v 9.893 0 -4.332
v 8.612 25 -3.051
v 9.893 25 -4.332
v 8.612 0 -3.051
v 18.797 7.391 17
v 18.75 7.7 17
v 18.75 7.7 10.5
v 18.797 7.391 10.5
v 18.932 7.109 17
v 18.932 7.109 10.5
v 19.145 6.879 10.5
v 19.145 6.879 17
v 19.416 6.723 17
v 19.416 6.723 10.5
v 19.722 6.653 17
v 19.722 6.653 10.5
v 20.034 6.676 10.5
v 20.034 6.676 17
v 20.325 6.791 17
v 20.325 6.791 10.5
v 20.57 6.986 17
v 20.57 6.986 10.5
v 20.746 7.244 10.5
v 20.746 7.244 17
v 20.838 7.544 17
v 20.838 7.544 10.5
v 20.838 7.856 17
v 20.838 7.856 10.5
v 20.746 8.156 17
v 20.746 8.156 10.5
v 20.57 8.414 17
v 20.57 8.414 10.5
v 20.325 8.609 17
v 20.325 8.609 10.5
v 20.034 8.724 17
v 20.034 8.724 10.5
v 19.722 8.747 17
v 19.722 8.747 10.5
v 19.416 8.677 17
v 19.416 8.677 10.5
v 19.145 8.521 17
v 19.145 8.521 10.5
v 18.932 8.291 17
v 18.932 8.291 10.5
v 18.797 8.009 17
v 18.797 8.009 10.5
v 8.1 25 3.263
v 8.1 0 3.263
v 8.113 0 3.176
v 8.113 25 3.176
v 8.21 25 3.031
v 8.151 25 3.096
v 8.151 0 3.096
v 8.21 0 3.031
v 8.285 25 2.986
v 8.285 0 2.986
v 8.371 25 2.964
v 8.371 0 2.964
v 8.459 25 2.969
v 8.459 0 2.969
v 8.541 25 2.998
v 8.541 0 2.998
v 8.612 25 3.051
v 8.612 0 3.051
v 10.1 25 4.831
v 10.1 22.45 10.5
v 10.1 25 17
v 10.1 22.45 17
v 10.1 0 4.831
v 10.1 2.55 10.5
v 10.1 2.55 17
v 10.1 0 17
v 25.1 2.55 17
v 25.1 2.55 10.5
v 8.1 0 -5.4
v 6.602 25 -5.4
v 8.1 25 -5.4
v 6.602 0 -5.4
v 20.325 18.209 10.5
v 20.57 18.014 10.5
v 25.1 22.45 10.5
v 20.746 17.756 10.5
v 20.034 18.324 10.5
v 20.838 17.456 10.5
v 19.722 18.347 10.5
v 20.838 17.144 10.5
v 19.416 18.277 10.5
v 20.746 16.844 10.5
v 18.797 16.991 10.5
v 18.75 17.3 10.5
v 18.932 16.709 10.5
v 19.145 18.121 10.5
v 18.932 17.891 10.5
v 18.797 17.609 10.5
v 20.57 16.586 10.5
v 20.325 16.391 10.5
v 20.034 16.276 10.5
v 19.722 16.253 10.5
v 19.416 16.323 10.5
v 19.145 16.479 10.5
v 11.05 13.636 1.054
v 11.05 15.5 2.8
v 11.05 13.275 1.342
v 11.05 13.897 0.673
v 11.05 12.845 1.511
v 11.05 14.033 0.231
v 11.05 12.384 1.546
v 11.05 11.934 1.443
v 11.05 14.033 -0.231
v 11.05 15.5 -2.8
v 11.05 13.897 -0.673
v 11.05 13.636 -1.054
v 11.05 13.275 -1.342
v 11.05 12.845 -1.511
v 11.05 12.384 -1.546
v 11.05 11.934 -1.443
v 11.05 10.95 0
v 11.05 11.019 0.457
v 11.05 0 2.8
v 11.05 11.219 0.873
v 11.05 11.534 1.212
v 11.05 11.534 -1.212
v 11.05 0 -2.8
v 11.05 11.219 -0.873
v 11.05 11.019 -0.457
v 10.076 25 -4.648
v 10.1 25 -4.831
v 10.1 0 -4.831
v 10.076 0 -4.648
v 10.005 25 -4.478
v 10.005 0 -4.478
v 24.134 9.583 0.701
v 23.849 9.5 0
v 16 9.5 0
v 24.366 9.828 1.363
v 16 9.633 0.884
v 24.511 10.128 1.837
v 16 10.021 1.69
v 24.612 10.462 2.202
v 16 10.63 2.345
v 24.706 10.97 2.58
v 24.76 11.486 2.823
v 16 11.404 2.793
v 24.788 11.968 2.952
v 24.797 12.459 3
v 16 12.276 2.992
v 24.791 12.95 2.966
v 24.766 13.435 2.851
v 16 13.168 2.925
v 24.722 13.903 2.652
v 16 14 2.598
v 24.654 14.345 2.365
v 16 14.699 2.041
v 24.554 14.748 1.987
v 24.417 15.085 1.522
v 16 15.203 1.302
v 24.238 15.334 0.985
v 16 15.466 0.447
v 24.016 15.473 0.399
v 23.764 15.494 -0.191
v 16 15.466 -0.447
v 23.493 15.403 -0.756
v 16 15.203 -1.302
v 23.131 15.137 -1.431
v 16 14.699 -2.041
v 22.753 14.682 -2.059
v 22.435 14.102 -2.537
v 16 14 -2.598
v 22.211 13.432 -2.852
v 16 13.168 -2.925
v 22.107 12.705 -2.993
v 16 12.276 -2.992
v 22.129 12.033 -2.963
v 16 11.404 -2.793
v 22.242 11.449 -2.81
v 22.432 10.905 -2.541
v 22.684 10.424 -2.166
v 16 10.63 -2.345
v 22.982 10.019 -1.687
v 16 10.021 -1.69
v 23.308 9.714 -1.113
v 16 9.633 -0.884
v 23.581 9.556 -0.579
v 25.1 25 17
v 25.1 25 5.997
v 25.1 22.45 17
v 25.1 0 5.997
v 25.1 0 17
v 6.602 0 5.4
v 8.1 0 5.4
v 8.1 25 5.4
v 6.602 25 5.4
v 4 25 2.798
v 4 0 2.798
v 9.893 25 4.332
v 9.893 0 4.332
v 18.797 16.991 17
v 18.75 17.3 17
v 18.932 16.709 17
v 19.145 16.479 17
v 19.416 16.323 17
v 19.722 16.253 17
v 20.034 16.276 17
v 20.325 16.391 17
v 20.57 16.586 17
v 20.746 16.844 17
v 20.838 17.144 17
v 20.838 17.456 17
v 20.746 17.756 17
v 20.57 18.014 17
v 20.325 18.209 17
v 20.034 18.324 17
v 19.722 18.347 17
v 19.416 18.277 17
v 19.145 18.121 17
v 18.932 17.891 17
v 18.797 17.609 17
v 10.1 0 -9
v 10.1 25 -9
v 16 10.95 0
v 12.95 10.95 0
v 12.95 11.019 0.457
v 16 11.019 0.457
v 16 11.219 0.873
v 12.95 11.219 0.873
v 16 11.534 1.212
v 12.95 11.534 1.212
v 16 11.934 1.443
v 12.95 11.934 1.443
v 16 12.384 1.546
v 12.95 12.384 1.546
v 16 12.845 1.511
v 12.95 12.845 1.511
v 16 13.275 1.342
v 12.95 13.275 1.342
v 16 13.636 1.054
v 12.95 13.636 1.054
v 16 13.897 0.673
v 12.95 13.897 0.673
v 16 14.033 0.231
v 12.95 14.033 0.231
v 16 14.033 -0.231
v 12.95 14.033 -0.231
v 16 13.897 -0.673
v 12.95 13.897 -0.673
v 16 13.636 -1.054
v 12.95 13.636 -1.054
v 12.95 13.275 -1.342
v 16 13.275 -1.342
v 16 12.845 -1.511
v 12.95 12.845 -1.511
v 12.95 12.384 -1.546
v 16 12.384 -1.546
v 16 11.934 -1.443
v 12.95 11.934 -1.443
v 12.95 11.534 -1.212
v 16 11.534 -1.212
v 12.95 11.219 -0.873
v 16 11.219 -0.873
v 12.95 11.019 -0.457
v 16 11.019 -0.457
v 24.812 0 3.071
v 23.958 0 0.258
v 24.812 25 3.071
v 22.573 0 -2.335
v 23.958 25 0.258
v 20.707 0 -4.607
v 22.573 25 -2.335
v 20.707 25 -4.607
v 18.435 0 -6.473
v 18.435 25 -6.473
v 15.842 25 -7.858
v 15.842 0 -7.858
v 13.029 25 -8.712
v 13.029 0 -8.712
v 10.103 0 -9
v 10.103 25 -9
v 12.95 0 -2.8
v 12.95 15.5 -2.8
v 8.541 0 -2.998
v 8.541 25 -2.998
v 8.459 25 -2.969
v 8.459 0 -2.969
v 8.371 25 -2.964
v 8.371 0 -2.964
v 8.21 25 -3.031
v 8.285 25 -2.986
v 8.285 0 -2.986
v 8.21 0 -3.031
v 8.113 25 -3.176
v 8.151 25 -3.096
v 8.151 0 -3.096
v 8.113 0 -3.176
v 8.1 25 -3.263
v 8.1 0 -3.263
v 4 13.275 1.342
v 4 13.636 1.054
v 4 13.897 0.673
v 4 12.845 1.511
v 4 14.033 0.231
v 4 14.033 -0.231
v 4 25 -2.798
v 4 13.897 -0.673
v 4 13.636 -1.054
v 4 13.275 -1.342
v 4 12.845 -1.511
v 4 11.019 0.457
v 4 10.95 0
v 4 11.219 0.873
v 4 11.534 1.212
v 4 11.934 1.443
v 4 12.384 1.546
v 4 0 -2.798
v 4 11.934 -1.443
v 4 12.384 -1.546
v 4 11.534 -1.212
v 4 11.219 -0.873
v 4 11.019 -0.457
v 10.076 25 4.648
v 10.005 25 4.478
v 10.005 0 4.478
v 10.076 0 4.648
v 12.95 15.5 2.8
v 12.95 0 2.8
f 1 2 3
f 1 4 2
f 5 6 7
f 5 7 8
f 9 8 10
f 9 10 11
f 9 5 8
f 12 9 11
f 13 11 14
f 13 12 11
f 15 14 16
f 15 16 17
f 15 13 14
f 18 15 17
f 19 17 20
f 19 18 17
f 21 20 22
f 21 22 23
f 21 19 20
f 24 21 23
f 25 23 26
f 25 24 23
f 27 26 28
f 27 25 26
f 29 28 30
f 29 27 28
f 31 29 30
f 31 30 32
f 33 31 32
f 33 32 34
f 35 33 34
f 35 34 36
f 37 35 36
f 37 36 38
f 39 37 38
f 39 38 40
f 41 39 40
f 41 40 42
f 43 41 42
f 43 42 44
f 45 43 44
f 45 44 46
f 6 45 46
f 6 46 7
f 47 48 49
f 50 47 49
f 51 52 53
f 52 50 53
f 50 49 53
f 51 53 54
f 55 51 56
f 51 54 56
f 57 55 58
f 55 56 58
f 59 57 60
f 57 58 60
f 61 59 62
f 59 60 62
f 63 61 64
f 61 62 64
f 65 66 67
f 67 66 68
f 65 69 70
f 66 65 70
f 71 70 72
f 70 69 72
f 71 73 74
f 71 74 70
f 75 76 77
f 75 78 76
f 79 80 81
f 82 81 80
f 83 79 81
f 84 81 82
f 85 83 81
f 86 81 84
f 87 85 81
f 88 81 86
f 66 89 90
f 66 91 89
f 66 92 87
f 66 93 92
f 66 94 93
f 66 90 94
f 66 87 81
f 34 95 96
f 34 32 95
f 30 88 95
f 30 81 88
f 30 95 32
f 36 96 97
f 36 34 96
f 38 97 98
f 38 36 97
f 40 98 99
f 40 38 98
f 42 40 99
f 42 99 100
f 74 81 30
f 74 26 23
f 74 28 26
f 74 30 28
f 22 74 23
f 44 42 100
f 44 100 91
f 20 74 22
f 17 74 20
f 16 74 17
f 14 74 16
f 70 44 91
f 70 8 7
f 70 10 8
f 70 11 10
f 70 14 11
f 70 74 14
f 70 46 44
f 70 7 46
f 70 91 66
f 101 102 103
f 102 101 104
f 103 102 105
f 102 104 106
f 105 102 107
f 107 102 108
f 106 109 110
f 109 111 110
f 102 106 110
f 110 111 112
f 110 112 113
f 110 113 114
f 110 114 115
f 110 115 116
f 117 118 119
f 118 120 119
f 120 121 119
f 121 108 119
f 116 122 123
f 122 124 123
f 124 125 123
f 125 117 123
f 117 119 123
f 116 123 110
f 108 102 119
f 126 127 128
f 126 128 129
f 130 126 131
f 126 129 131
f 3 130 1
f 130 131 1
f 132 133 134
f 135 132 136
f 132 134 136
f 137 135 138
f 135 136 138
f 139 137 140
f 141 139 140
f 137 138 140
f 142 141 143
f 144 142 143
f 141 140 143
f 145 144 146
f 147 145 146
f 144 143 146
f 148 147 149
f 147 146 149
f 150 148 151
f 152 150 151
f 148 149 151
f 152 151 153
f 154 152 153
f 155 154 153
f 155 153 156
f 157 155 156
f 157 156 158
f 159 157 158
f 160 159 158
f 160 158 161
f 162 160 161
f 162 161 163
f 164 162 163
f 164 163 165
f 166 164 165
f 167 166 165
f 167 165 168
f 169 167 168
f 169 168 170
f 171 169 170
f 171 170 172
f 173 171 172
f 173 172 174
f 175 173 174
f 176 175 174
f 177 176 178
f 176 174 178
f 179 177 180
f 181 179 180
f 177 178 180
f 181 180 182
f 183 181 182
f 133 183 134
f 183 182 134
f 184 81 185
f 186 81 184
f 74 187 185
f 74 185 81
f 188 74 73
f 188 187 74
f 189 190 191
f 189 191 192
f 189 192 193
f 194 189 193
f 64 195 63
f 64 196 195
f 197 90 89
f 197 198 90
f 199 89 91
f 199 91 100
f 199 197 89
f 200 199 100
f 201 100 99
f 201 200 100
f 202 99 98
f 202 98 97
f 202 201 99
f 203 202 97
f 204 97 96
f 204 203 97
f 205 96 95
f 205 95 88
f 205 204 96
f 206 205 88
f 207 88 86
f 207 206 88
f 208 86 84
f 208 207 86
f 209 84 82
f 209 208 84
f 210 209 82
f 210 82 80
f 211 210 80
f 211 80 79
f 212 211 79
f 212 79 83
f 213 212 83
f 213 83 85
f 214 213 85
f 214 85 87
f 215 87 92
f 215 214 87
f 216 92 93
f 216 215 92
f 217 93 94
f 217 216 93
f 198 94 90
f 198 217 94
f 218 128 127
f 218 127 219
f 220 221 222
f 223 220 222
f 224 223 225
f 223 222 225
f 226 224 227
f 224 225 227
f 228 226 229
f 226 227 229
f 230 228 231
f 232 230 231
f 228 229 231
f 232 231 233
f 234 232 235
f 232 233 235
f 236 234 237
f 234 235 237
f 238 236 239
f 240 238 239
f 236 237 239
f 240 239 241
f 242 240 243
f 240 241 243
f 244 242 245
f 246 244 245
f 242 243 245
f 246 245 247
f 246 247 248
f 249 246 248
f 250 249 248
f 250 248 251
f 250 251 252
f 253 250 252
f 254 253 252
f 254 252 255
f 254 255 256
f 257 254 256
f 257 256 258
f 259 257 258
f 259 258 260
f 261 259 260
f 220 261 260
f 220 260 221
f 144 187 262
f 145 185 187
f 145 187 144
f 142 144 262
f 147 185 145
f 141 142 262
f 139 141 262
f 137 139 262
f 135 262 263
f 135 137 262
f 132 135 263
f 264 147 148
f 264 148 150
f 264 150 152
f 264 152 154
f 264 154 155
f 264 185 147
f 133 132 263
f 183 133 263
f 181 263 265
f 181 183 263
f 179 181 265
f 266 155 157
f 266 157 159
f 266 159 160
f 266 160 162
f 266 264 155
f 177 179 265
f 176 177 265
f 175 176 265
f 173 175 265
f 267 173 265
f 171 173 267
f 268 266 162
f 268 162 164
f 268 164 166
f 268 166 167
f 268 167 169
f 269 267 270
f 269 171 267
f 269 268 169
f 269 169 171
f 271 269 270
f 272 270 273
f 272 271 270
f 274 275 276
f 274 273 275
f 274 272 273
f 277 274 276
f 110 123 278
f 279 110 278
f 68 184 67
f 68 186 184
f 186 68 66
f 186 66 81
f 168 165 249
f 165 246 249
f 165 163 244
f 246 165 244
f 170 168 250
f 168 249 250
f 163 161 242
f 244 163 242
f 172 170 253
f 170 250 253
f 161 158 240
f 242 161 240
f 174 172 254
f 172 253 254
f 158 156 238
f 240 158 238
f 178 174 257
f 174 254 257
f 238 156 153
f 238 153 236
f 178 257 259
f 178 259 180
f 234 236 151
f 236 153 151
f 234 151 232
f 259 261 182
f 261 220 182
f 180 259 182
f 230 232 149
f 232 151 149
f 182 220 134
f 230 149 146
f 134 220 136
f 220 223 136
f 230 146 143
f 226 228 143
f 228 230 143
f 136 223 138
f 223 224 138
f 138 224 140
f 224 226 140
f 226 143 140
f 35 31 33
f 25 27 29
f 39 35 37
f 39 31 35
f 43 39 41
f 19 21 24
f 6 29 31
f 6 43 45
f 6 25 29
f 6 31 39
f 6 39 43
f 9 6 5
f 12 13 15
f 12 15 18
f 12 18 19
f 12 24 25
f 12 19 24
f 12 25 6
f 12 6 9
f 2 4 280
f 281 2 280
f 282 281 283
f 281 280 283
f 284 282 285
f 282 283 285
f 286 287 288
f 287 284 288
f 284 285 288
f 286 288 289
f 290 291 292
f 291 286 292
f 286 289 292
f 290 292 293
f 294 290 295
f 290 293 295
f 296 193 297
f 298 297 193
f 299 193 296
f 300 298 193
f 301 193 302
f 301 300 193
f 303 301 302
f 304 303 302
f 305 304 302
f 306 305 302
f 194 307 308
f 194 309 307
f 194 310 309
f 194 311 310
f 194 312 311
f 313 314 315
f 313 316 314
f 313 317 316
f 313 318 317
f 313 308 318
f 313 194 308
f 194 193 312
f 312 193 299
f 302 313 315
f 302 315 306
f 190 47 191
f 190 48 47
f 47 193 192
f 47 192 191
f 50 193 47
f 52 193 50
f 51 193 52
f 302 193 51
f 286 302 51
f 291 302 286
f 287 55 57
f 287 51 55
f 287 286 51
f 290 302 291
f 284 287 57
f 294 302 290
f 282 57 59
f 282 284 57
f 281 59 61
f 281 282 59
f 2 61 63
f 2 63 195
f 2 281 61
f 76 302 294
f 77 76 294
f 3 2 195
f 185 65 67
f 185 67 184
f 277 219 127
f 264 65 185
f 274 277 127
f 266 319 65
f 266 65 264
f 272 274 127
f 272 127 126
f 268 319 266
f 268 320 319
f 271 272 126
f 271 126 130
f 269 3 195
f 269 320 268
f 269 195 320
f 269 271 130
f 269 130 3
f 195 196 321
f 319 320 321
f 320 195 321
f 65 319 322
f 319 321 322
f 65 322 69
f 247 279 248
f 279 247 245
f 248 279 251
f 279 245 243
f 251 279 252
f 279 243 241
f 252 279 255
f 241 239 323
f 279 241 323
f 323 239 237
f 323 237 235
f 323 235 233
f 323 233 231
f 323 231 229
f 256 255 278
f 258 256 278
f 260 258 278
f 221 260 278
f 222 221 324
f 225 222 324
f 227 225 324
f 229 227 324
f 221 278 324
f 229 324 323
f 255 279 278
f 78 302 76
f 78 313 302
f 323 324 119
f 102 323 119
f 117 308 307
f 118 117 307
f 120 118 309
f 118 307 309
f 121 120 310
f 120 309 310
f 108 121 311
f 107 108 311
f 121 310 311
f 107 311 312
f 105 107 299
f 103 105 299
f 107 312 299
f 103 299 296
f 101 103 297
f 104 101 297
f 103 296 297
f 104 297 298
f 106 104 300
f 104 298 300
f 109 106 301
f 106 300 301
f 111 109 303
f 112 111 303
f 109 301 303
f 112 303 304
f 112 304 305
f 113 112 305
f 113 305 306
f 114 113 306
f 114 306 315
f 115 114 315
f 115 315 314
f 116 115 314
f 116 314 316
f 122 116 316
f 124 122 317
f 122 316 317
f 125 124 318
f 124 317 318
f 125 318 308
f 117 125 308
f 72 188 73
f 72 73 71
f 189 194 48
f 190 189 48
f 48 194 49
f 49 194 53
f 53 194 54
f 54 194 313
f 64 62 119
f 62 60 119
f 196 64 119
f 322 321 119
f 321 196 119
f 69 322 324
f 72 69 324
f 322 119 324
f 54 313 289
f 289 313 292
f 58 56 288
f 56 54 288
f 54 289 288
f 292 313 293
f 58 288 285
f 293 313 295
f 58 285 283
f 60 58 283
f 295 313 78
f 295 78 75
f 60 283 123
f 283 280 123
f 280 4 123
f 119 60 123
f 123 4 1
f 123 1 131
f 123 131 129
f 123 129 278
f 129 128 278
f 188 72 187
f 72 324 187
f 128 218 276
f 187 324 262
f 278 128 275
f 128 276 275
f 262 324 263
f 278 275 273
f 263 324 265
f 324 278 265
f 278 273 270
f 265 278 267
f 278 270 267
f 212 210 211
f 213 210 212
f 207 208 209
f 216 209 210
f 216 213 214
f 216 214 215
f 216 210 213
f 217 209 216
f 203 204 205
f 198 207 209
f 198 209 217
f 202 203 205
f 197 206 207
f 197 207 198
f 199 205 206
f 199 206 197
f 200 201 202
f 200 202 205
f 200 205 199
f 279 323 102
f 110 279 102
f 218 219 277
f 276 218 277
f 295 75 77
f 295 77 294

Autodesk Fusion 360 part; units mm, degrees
sketch "Sketch1" plane through (0, 0, 0) normal (0, 1, 0) x (1, 0, 0)
  line L0 (-4.4022, -9.8222) -> (-3.1214, -8.5414)
  arc A0 (10, -4.8314) -> (9.8222, -4.4022) centre (9.3929, -4.8314) ccw
  line L1 (6.5607, -5.5) -> (3.9, -2.8393)
  line L2 (-9.9987, -4.7917) -> (-10, -9.5)
  line L3 (9.8222, -4.4022) -> (8.5414, -3.1214)
  arc A1 (-3.2628, 8.2) -> (-3.1214, 8.5414) centre (-3.2628, 8.4) ccw
  line L4 (3.9, 2.8393) -> (6.5607, 5.5)
  arc A2 (-8.5414, 3.1214) -> (-8.2, 3.2628) centre (-8.4, 3.2628) ccw
  line L5 (-4.8314, 10) -> (-9.5, 10)
  line L6 (-6.5607, 5.5) -> (-3.9, 2.8393)
  arc A3 (-9.5, 10) -> (-10, 9.5) centre (-9.5, 9.5) ccw
  arc A4 (8.2, 3.2628) -> (8.5414, 3.1214) centre (8.4, 3.2628) ccw
  line L7 (-5.5, 6.5607) -> (-5.5, 8.2)
  line L8 (6.5607, 5.5) -> (8.2, 5.5)
  line L9 (8.5414, 3.1214) -> (9.8222, 4.4022)
  arc A5 (3.1214, 8.5414) -> (3.2628, 8.2) centre (3.2628, 8.4) ccw
  line L10 (-8.2, 3.2628) -> (-8.2, 5.5)
  line L11 (9.5, 10) -> (4.8314, 10)
  arc A6 (10, 9.5) -> (9.5, 10) centre (9.5, 9.5) ccw
  line L12 (10, 4.8314) -> (10, 9.5)
  arc A7 (-4.4312, 9.8494) -> (-4.8314, 10) centre (-4.8314, 9.3929) ccw
  line L13 (-9.8494, 4.4312) -> (-8.5414, 3.1214)
  line L14 (4.4022, 9.8222) -> (3.1214, 8.5414)
  line L15 (-5.5, 8.2) -> (-3.2628, 8.2)
  line L16 (5.5, 8.2) -> (5.5, 6.5607)
  arc A8 (-10, 4.9) -> (-9.8494, 4.4312) centre (-9.3734, 4.8428) ccw
  circle A9 centre (0, 0) radius 2.1
  arc A10 (4.8314, 10) -> (4.4022, 9.8222) centre (4.8314, 9.3929) ccw
  line L17 (-2.8393, 3.9) -> (-5.5, 6.5607)
  line L18 (5.5, 6.5607) -> (2.8393, 3.9)
  line L19 (-3.9, 2.8393) -> (-3.9, -2.8393)
  line L20 (-10, 9.5) -> (-10, 4.9)
  line L21 (2.8393, 3.9) -> (-2.8393, 3.9)
  line L22 (3.9, -2.8393) -> (3.9, 2.8393)
  line L23 (3.2628, 8.2) -> (5.5, 8.2)
  line L24 (8.2, 5.5) -> (8.2, 3.2628)
  line L25 (5.5, -6.5607) -> (5.5, -8.2)
  arc A11 (4.2336, -9.6536) -> (4.8314, -10) centre (4.8837, -9.2207) ccw
  arc A12 (-4.8314, -10) -> (-4.4022, -9.8222) centre (-4.8314, -9.3929) ccw
  line L26 (-5.5, -6.5607) -> (-2.8393, -3.9)
  line L27 (10, -9.5) -> (10, -4.8314)
  line L28 (-8.5414, -3.1214) -> (-9.8222, -4.4022)
  line L29 (5.5, -8.2) -> (3.2628, -8.2)
  line L30 (4.8314, -10) -> (9.5, -10)
  line L31 (-8.2, -5.5) -> (-8.2, -3.2628)
  arc A13 (8.5414, -3.1214) -> (8.2, -3.2628) centre (8.4, -3.2628) ccw
  line L32 (-2.8393, -3.9) -> (2.8393, -3.9)
  arc A14 (-8.2, -3.2628) -> (-8.5414, -3.1214) centre (-8.4, -3.2628) ccw
  arc A15 (-3.1214, -8.5414) -> (-3.2628, -8.2) centre (-3.2628, -8.4) ccw
  line L33 (3.1214, -8.5414) -> (4.2336, -9.6536)
  line L34 (-5.5, -8.2) -> (-5.5, -6.5607)
  line L35 (-6.5607, -5.5) -> (-8.2, -5.5)
  line L36 (8.2, -3.2628) -> (8.2, -5.5)
  arc A16 (-9.8222, -4.4022) -> (-9.9987, -4.7917) centre (-9.3929, -4.8314) ccw
  line L37 (-9.5, -10) -> (-4.8314, -10)
  arc A17 (-10, -9.5) -> (-9.5, -10) centre (-9.5, -9.5) ccw
  arc A18 (3.2628, -8.2) -> (3.1214, -8.5414) centre (3.2628, -8.4) ccw
  line L38 (8.2, -5.5) -> (6.5607, -5.5)
  line L39 (-3.2628, -8.2) -> (-5.5, -8.2)
  line L40 (-3.9, -2.8393) -> (-6.5607, -5.5)
  line L41 (2.8393, -3.9) -> (5.5, -6.5607)
  arc A19 (9.5, -10) -> (10, -9.5) centre (9.5, -9.5) ccw
  line L42 (-3.1214, 8.5414) -> (-4.4312, 9.8494)
  arc A20 (9.8222, 4.4022) -> (10, 4.8314) centre (9.3929, 4.8314) ccw
  line L43 (-8.2, 5.5) -> (-6.5607, 5.5)
  line L44 (4, 2.7979) -> (6.6021, 5.4)
  line L45 (6.6021, 5.4) -> (8.1, 5.4)
  line L46 (8.1, 5.4) -> (8.1, 3.2628)
  arc A21 (8.1, 3.2628) -> (8.6121, 3.0507) centre (8.4, 3.2628) ccw
  line L47 (8.6121, 3.0507) -> (9.8929, 4.3315)
  arc A22 (9.8929, 4.3315) -> (10.1, 4.8314) centre (9.3929, 4.8314) ccw
  line L48 (10.1, 4.8314) -> (10.1, 9.5)
  arc A23 (10.1, 9.5) -> (9.5, 10.1) centre (9.5, 9.5) ccw
  line L49 (9.5, 10.1) -> (4.8314, 10.1)
  arc A24 (4.8314, 10.1) -> (4.3315, 9.8929) centre (4.8314, 9.3929) ccw
  line L50 (4.3315, 9.8929) -> (3.0507, 8.6121)
  arc A25 (3.0507, 8.6121) -> (3.2628, 8.1) centre (3.2628, 8.4) ccw
  line L51 (3.2628, 8.1) -> (5.4, 8.1)
  line L52 (5.4, 8.1) -> (5.4, 6.6021)
  line L53 (5.4, 6.6021) -> (2.7979, 4)
  line L54 (2.7979, 4) -> (-2.7979, 4)
  line L55 (-2.7979, 4) -> (-5.4, 6.6021)
  line L56 (-5.4, 6.6021) -> (-5.4, 8.1)
  line L57 (-5.4, 8.1) -> (-3.2628, 8.1)
  arc A26 (-3.2628, 8.1) -> (-3.0509, 8.6124) centre (-3.2628, 8.4) ccw
  line L58 (-3.0509, 8.6124) -> (-4.3627, 9.9223)
  arc A27 (-4.3627, 9.9223) -> (-4.8314, 10.1) centre (-4.8314, 9.3929) ccw
  line L59 (-4.8314, 10.1) -> (-9.5, 10.1)
  arc A28 (-9.5, 10.1) -> (-10.1, 9.5) centre (-9.5, 9.5) ccw
  line L60 (-10.1, 9.5) -> (-10.1, 4.9044)
  arc A29 (-10.1, 4.9044) -> (-9.9226, 4.363) centre (-9.3734, 4.8428) ccw
  line L61 (-9.9226, 4.363) -> (-8.6124, 3.0509)
  arc A30 (-8.6124, 3.0509) -> (-8.1, 3.2628) centre (-8.4, 3.2628) ccw
  line L62 (-8.1, 3.2628) -> (-8.1, 5.4)
  line L63 (-8.1, 5.4) -> (-6.6021, 5.4)
  line L64 (-6.6021, 5.4) -> (-4, 2.7979)
  line L65 (-4, 2.7979) -> (-4, -2.7979)
  line L66 (-4, -2.7979) -> (-6.6021, -5.4)
  line L67 (-6.6021, -5.4) -> (-8.1, -5.4)
  line L68 (-8.1, -5.4) -> (-8.1, -3.2628)
  arc A31 (-8.1, -3.2628) -> (-8.6121, -3.0507) centre (-8.4, -3.2628) ccw
  line L69 (-8.6121, -3.0507) -> (-9.8929, -4.3315)
  arc A32 (-9.8929, -4.3315) -> (-10.0987, -4.7886) centre (-9.3929, -4.8314) ccw
  line L70 (-10.0987, -4.7886) -> (-10.1, -9.4997)
  arc A33 (-10.1, -9.4997) -> (-9.5, -10.1) centre (-9.5, -9.5) ccw
  line L71 (-9.5, -10.1) -> (-4.8314, -10.1)
  arc A34 (-4.8314, -10.1) -> (-4.3315, -9.8929) centre (-4.8314, -9.3929) ccw
  line L72 (-4.3315, -9.8929) -> (-3.0507, -8.6121)
  arc A35 (-3.0507, -8.6121) -> (-3.2628, -8.1) centre (-3.2628, -8.4) ccw
  line L73 (-3.2628, -8.1) -> (-5.4, -8.1)
  line L74 (-5.4, -8.1) -> (-5.4, -6.6021)
  line L75 (-5.4, -6.6021) -> (-2.7979, -4)
  line L76 (-2.7979, -4) -> (2.7979, -4)
  line L77 (2.7979, -4) -> (5.4, -6.6021)
  line L78 (5.4, -6.6021) -> (5.4, -8.1)
  line L79 (5.4, -8.1) -> (3.2628, -8.1)
  arc A36 (3.2628, -8.1) -> (3.0507, -8.6121) centre (3.2628, -8.4) ccw
  line L80 (3.0507, -8.6121) -> (4.1561, -9.7175)
  arc A37 (4.1561, -9.7175) -> (4.8282, -10.1) centre (4.8837, -9.2207) ccw
  line L81 (4.8282, -10.1) -> (9.5, -10.1)
  arc A38 (9.5, -10.1) -> (10.1, -9.5) centre (9.5, -9.5) ccw
  line L82 (10.1, -9.5) -> (10.1, -4.8314)
  arc A39 (10.1, -4.8314) -> (9.8929, -4.3315) centre (9.3929, -4.8314) ccw
  line L83 (9.8929, -4.3315) -> (8.6121, -3.0507)
  arc A40 (8.6121, -3.0507) -> (8.1, -3.2628) centre (8.4, -3.2628) ccw
  line L84 (8.1, -3.2628) -> (8.1, -5.4)
  line L85 (8.1, -5.4) -> (6.6021, -5.4)
  line L86 (6.6021, -5.4) -> (4, -2.7979)
  line L87 (4, -2.7979) -> (4, 2.7979)
  line L88 (9, 9) -> (25.1, 9)
  line L89 (25.1, 9) -> (25.1, -17)
  line L90 (25.1, -17) -> (9, -17)
  line L91 (9, -17) -> (9, 9)
  line L92 (10.1, -5.988) -> (10.1, -17)
  dimension "d1" = 0.1
  dimension "d2" = 16.1
  dimension "d3" = 26
extrude "Extrude1" add sketch "Sketch1" along normal blind 25 contours L47 A22 L48 L82 A39 L83 L88 L89 L90 L91 L92 | L44 L45 L46 A21 L47 L83 A40 L84 L85 L86 L87 L91
fillet "Fillet1" radius 15 1 edges at (25.1, 12.5, -9)
sketch "Sketch2" plane through (0, 0, 17) normal (0, 0, 1) x (-1, 0, 0)
  line L0 (-10.1, 0) -> (-25.1, 0)
  line L1 (-25.1, 0) -> (-25.1, -25)
  line L2 (-25.1, -25) -> (-10.1, -25)
  line L3 (-10.1, -25) -> (-10.1, 0)
  line L4 (-10.1, 0) -> (-12.1, 0) construction
  line L5 (-12.1, 0) -> (-25.1, 0) construction
  line L6 (-18.6, 0) -> (-18.6, -25) construction
  line L7 (-25.1, -12.5) -> (-18.6, -12.5) construction
  line L8 (-25.1, -2.55) -> (-12.1, -2.55)
  line L9 (-12.1, -2.55) -> (-12.1, -22.45)
  line L10 (-12.1, -22.45) -> (-25.1, -22.45)
  line L11 (-25.1, -22.45) -> (-25.1, -2.55)
  line L12 (-25.1, -2.55) -> (-12.1, -22.45) construction
  line L13 (-12.1, -2.55) -> (-25.1, -22.45) construction
  line L14 (-12.1, -2.55) -> (-19.8, -2.55) construction
  line L15 (-19.8, -2.55) -> (-19.8, -22.45) construction
  line L16 (-19.8, -2.55) -> (-19.8, -7.7) construction
  line L17 (-19.8, -7.7) -> (-19.8, -17.3) construction
  line L18 (-19.8, -17.3) -> (-19.8, -22.45) construction
  circle A0 centre (-19.8, -7.7) radius 1.05
  circle A1 centre (-19.8, -17.3) radius 1.05
  line L19 (-12.1, -2.55) -> (-10.1, -2.55)
  line L20 (-10.1, -2.55) -> (-10.1, -22.45)
  line L21 (-10.1, -22.45) -> (-12.1, -22.45)
  line L22 (-12.1, -22.45) -> (-12.1, -2.55)
  point P0 (-18.6, -12.5)
  dimension "d8" = 2
  dimension "d9" = 19.9
  dimension "d10" = 7.7
  dimension "d11" = 5.15
  dimension "d12" = 9.6
  dimension "d13" = 5.15
  dimension "d14" = 2.1
  dimension "d15" = 2.1
  dimension "d16" = 19.9
extrude "Extrude2" cut sketch "Sketch2" against normal blind 6.5 contours L3 L9 L19 L20 L21 L22 | L1 L8 L9 L10 L11 L22
sketch "Sketch3" plane through (0, 25, 0) normal (0, 1, 0) x (-1, 0, 0)
  arc A0 (-25.1, 6) -> (-10.1, -9) centre (-10.1, 6) ccw
  line L0 (-10.1, -9) -> (-10.1, -4.8314)
  arc A1 (-9.8929, -4.3315) -> (-10.1, -4.8314) centre (-9.3929, -4.8314) ccw
  line L1 (-9.8929, -4.3315) -> (-8.6121, -3.0507)
  arc A2 (-8.1, -3.2628) -> (-8.6121, -3.0507) centre (-8.4, -3.2628) ccw
  line L2 (-8.1, -3.2628) -> (-8.1, -5.4)
  line L3 (-8.1, -5.4) -> (-6.6021, -5.4)
  line L4 (-6.6021, -5.4) -> (-4, -2.7979)
  line L5 (-4, -2.7979) -> (-4, 2.7979)
  line L6 (-4, 2.7979) -> (-6.6021, 5.4)
  line L7 (-6.6021, 5.4) -> (-8.1, 5.4)
  line L8 (-8.1, 5.4) -> (-8.1, 3.2628)
  arc A3 (-8.6121, 3.0507) -> (-8.1, 3.2628) centre (-8.4, 3.2628) ccw
  line L9 (-8.6121, 3.0507) -> (-9.8929, 4.3315)
  arc A4 (-10.1, 4.8314) -> (-9.8929, 4.3315) centre (-9.3929, 4.8314) ccw
  line L10 (-10.1, 4.8314) -> (-10.1, 5.988)
  line L11 (-10.1, 5.988) -> (-10.1, 17)
  line L12 (-10.1, 17) -> (-25.1, 17)
  line L13 (-25.1, 17) -> (-25.1, 6)
  line L14 (-12.95, 2.8) -> (-11.05, 2.8)
  line L15 (-11.05, 2.8) -> (-11.05, -2.8)
  line L16 (-11.05, -2.8) -> (-12.95, -2.8)
  line L17 (-12.95, -2.8) -> (-12.95, 2.8)
  line L18 (-12.95, 2.8) -> (-11.05, -2.8) construction
  line L19 (-11.05, 2.8) -> (-12.95, -2.8) construction
  point P0 (-12, 0)
  dimension "d19" = 1.9
  dimension "d20" = 5.6
sketch "Sketch4" plane through (4, 0, 0) normal (-1, 0, 0) x (0, -1, 0)
  line L0 (0, -2.7979) -> (0, 2.7979)
  line L1 (0, 2.7979) -> (-25, 2.7979)
  line L2 (-25, 2.7979) -> (-25, -2.7979)
  line L3 (-25, -2.7979) -> (0, -2.7979)
  line L4 (0, 0) -> (-12.5, 0) construction
  circle A0 centre (-12.5, 0) radius 1.55
  circle A1 centre (-12.5, 0) radius 3
  dimension "d21" = 3.1
  dimension "d22" = 6
extrude "Extrude3" cut sketch "Sketch4" against normal blind 21 contours A0
extrude "Extrude4" cut sketch "Sketch4" against normal blind 10 from surface at -12 contours L3 A1 | L1 L3 A1 | L1 A1
extrude "Extrude5" cut sketch "Sketch3" along normal blind 15.5 from surface at -25 contours L14 L15 L16 L17
